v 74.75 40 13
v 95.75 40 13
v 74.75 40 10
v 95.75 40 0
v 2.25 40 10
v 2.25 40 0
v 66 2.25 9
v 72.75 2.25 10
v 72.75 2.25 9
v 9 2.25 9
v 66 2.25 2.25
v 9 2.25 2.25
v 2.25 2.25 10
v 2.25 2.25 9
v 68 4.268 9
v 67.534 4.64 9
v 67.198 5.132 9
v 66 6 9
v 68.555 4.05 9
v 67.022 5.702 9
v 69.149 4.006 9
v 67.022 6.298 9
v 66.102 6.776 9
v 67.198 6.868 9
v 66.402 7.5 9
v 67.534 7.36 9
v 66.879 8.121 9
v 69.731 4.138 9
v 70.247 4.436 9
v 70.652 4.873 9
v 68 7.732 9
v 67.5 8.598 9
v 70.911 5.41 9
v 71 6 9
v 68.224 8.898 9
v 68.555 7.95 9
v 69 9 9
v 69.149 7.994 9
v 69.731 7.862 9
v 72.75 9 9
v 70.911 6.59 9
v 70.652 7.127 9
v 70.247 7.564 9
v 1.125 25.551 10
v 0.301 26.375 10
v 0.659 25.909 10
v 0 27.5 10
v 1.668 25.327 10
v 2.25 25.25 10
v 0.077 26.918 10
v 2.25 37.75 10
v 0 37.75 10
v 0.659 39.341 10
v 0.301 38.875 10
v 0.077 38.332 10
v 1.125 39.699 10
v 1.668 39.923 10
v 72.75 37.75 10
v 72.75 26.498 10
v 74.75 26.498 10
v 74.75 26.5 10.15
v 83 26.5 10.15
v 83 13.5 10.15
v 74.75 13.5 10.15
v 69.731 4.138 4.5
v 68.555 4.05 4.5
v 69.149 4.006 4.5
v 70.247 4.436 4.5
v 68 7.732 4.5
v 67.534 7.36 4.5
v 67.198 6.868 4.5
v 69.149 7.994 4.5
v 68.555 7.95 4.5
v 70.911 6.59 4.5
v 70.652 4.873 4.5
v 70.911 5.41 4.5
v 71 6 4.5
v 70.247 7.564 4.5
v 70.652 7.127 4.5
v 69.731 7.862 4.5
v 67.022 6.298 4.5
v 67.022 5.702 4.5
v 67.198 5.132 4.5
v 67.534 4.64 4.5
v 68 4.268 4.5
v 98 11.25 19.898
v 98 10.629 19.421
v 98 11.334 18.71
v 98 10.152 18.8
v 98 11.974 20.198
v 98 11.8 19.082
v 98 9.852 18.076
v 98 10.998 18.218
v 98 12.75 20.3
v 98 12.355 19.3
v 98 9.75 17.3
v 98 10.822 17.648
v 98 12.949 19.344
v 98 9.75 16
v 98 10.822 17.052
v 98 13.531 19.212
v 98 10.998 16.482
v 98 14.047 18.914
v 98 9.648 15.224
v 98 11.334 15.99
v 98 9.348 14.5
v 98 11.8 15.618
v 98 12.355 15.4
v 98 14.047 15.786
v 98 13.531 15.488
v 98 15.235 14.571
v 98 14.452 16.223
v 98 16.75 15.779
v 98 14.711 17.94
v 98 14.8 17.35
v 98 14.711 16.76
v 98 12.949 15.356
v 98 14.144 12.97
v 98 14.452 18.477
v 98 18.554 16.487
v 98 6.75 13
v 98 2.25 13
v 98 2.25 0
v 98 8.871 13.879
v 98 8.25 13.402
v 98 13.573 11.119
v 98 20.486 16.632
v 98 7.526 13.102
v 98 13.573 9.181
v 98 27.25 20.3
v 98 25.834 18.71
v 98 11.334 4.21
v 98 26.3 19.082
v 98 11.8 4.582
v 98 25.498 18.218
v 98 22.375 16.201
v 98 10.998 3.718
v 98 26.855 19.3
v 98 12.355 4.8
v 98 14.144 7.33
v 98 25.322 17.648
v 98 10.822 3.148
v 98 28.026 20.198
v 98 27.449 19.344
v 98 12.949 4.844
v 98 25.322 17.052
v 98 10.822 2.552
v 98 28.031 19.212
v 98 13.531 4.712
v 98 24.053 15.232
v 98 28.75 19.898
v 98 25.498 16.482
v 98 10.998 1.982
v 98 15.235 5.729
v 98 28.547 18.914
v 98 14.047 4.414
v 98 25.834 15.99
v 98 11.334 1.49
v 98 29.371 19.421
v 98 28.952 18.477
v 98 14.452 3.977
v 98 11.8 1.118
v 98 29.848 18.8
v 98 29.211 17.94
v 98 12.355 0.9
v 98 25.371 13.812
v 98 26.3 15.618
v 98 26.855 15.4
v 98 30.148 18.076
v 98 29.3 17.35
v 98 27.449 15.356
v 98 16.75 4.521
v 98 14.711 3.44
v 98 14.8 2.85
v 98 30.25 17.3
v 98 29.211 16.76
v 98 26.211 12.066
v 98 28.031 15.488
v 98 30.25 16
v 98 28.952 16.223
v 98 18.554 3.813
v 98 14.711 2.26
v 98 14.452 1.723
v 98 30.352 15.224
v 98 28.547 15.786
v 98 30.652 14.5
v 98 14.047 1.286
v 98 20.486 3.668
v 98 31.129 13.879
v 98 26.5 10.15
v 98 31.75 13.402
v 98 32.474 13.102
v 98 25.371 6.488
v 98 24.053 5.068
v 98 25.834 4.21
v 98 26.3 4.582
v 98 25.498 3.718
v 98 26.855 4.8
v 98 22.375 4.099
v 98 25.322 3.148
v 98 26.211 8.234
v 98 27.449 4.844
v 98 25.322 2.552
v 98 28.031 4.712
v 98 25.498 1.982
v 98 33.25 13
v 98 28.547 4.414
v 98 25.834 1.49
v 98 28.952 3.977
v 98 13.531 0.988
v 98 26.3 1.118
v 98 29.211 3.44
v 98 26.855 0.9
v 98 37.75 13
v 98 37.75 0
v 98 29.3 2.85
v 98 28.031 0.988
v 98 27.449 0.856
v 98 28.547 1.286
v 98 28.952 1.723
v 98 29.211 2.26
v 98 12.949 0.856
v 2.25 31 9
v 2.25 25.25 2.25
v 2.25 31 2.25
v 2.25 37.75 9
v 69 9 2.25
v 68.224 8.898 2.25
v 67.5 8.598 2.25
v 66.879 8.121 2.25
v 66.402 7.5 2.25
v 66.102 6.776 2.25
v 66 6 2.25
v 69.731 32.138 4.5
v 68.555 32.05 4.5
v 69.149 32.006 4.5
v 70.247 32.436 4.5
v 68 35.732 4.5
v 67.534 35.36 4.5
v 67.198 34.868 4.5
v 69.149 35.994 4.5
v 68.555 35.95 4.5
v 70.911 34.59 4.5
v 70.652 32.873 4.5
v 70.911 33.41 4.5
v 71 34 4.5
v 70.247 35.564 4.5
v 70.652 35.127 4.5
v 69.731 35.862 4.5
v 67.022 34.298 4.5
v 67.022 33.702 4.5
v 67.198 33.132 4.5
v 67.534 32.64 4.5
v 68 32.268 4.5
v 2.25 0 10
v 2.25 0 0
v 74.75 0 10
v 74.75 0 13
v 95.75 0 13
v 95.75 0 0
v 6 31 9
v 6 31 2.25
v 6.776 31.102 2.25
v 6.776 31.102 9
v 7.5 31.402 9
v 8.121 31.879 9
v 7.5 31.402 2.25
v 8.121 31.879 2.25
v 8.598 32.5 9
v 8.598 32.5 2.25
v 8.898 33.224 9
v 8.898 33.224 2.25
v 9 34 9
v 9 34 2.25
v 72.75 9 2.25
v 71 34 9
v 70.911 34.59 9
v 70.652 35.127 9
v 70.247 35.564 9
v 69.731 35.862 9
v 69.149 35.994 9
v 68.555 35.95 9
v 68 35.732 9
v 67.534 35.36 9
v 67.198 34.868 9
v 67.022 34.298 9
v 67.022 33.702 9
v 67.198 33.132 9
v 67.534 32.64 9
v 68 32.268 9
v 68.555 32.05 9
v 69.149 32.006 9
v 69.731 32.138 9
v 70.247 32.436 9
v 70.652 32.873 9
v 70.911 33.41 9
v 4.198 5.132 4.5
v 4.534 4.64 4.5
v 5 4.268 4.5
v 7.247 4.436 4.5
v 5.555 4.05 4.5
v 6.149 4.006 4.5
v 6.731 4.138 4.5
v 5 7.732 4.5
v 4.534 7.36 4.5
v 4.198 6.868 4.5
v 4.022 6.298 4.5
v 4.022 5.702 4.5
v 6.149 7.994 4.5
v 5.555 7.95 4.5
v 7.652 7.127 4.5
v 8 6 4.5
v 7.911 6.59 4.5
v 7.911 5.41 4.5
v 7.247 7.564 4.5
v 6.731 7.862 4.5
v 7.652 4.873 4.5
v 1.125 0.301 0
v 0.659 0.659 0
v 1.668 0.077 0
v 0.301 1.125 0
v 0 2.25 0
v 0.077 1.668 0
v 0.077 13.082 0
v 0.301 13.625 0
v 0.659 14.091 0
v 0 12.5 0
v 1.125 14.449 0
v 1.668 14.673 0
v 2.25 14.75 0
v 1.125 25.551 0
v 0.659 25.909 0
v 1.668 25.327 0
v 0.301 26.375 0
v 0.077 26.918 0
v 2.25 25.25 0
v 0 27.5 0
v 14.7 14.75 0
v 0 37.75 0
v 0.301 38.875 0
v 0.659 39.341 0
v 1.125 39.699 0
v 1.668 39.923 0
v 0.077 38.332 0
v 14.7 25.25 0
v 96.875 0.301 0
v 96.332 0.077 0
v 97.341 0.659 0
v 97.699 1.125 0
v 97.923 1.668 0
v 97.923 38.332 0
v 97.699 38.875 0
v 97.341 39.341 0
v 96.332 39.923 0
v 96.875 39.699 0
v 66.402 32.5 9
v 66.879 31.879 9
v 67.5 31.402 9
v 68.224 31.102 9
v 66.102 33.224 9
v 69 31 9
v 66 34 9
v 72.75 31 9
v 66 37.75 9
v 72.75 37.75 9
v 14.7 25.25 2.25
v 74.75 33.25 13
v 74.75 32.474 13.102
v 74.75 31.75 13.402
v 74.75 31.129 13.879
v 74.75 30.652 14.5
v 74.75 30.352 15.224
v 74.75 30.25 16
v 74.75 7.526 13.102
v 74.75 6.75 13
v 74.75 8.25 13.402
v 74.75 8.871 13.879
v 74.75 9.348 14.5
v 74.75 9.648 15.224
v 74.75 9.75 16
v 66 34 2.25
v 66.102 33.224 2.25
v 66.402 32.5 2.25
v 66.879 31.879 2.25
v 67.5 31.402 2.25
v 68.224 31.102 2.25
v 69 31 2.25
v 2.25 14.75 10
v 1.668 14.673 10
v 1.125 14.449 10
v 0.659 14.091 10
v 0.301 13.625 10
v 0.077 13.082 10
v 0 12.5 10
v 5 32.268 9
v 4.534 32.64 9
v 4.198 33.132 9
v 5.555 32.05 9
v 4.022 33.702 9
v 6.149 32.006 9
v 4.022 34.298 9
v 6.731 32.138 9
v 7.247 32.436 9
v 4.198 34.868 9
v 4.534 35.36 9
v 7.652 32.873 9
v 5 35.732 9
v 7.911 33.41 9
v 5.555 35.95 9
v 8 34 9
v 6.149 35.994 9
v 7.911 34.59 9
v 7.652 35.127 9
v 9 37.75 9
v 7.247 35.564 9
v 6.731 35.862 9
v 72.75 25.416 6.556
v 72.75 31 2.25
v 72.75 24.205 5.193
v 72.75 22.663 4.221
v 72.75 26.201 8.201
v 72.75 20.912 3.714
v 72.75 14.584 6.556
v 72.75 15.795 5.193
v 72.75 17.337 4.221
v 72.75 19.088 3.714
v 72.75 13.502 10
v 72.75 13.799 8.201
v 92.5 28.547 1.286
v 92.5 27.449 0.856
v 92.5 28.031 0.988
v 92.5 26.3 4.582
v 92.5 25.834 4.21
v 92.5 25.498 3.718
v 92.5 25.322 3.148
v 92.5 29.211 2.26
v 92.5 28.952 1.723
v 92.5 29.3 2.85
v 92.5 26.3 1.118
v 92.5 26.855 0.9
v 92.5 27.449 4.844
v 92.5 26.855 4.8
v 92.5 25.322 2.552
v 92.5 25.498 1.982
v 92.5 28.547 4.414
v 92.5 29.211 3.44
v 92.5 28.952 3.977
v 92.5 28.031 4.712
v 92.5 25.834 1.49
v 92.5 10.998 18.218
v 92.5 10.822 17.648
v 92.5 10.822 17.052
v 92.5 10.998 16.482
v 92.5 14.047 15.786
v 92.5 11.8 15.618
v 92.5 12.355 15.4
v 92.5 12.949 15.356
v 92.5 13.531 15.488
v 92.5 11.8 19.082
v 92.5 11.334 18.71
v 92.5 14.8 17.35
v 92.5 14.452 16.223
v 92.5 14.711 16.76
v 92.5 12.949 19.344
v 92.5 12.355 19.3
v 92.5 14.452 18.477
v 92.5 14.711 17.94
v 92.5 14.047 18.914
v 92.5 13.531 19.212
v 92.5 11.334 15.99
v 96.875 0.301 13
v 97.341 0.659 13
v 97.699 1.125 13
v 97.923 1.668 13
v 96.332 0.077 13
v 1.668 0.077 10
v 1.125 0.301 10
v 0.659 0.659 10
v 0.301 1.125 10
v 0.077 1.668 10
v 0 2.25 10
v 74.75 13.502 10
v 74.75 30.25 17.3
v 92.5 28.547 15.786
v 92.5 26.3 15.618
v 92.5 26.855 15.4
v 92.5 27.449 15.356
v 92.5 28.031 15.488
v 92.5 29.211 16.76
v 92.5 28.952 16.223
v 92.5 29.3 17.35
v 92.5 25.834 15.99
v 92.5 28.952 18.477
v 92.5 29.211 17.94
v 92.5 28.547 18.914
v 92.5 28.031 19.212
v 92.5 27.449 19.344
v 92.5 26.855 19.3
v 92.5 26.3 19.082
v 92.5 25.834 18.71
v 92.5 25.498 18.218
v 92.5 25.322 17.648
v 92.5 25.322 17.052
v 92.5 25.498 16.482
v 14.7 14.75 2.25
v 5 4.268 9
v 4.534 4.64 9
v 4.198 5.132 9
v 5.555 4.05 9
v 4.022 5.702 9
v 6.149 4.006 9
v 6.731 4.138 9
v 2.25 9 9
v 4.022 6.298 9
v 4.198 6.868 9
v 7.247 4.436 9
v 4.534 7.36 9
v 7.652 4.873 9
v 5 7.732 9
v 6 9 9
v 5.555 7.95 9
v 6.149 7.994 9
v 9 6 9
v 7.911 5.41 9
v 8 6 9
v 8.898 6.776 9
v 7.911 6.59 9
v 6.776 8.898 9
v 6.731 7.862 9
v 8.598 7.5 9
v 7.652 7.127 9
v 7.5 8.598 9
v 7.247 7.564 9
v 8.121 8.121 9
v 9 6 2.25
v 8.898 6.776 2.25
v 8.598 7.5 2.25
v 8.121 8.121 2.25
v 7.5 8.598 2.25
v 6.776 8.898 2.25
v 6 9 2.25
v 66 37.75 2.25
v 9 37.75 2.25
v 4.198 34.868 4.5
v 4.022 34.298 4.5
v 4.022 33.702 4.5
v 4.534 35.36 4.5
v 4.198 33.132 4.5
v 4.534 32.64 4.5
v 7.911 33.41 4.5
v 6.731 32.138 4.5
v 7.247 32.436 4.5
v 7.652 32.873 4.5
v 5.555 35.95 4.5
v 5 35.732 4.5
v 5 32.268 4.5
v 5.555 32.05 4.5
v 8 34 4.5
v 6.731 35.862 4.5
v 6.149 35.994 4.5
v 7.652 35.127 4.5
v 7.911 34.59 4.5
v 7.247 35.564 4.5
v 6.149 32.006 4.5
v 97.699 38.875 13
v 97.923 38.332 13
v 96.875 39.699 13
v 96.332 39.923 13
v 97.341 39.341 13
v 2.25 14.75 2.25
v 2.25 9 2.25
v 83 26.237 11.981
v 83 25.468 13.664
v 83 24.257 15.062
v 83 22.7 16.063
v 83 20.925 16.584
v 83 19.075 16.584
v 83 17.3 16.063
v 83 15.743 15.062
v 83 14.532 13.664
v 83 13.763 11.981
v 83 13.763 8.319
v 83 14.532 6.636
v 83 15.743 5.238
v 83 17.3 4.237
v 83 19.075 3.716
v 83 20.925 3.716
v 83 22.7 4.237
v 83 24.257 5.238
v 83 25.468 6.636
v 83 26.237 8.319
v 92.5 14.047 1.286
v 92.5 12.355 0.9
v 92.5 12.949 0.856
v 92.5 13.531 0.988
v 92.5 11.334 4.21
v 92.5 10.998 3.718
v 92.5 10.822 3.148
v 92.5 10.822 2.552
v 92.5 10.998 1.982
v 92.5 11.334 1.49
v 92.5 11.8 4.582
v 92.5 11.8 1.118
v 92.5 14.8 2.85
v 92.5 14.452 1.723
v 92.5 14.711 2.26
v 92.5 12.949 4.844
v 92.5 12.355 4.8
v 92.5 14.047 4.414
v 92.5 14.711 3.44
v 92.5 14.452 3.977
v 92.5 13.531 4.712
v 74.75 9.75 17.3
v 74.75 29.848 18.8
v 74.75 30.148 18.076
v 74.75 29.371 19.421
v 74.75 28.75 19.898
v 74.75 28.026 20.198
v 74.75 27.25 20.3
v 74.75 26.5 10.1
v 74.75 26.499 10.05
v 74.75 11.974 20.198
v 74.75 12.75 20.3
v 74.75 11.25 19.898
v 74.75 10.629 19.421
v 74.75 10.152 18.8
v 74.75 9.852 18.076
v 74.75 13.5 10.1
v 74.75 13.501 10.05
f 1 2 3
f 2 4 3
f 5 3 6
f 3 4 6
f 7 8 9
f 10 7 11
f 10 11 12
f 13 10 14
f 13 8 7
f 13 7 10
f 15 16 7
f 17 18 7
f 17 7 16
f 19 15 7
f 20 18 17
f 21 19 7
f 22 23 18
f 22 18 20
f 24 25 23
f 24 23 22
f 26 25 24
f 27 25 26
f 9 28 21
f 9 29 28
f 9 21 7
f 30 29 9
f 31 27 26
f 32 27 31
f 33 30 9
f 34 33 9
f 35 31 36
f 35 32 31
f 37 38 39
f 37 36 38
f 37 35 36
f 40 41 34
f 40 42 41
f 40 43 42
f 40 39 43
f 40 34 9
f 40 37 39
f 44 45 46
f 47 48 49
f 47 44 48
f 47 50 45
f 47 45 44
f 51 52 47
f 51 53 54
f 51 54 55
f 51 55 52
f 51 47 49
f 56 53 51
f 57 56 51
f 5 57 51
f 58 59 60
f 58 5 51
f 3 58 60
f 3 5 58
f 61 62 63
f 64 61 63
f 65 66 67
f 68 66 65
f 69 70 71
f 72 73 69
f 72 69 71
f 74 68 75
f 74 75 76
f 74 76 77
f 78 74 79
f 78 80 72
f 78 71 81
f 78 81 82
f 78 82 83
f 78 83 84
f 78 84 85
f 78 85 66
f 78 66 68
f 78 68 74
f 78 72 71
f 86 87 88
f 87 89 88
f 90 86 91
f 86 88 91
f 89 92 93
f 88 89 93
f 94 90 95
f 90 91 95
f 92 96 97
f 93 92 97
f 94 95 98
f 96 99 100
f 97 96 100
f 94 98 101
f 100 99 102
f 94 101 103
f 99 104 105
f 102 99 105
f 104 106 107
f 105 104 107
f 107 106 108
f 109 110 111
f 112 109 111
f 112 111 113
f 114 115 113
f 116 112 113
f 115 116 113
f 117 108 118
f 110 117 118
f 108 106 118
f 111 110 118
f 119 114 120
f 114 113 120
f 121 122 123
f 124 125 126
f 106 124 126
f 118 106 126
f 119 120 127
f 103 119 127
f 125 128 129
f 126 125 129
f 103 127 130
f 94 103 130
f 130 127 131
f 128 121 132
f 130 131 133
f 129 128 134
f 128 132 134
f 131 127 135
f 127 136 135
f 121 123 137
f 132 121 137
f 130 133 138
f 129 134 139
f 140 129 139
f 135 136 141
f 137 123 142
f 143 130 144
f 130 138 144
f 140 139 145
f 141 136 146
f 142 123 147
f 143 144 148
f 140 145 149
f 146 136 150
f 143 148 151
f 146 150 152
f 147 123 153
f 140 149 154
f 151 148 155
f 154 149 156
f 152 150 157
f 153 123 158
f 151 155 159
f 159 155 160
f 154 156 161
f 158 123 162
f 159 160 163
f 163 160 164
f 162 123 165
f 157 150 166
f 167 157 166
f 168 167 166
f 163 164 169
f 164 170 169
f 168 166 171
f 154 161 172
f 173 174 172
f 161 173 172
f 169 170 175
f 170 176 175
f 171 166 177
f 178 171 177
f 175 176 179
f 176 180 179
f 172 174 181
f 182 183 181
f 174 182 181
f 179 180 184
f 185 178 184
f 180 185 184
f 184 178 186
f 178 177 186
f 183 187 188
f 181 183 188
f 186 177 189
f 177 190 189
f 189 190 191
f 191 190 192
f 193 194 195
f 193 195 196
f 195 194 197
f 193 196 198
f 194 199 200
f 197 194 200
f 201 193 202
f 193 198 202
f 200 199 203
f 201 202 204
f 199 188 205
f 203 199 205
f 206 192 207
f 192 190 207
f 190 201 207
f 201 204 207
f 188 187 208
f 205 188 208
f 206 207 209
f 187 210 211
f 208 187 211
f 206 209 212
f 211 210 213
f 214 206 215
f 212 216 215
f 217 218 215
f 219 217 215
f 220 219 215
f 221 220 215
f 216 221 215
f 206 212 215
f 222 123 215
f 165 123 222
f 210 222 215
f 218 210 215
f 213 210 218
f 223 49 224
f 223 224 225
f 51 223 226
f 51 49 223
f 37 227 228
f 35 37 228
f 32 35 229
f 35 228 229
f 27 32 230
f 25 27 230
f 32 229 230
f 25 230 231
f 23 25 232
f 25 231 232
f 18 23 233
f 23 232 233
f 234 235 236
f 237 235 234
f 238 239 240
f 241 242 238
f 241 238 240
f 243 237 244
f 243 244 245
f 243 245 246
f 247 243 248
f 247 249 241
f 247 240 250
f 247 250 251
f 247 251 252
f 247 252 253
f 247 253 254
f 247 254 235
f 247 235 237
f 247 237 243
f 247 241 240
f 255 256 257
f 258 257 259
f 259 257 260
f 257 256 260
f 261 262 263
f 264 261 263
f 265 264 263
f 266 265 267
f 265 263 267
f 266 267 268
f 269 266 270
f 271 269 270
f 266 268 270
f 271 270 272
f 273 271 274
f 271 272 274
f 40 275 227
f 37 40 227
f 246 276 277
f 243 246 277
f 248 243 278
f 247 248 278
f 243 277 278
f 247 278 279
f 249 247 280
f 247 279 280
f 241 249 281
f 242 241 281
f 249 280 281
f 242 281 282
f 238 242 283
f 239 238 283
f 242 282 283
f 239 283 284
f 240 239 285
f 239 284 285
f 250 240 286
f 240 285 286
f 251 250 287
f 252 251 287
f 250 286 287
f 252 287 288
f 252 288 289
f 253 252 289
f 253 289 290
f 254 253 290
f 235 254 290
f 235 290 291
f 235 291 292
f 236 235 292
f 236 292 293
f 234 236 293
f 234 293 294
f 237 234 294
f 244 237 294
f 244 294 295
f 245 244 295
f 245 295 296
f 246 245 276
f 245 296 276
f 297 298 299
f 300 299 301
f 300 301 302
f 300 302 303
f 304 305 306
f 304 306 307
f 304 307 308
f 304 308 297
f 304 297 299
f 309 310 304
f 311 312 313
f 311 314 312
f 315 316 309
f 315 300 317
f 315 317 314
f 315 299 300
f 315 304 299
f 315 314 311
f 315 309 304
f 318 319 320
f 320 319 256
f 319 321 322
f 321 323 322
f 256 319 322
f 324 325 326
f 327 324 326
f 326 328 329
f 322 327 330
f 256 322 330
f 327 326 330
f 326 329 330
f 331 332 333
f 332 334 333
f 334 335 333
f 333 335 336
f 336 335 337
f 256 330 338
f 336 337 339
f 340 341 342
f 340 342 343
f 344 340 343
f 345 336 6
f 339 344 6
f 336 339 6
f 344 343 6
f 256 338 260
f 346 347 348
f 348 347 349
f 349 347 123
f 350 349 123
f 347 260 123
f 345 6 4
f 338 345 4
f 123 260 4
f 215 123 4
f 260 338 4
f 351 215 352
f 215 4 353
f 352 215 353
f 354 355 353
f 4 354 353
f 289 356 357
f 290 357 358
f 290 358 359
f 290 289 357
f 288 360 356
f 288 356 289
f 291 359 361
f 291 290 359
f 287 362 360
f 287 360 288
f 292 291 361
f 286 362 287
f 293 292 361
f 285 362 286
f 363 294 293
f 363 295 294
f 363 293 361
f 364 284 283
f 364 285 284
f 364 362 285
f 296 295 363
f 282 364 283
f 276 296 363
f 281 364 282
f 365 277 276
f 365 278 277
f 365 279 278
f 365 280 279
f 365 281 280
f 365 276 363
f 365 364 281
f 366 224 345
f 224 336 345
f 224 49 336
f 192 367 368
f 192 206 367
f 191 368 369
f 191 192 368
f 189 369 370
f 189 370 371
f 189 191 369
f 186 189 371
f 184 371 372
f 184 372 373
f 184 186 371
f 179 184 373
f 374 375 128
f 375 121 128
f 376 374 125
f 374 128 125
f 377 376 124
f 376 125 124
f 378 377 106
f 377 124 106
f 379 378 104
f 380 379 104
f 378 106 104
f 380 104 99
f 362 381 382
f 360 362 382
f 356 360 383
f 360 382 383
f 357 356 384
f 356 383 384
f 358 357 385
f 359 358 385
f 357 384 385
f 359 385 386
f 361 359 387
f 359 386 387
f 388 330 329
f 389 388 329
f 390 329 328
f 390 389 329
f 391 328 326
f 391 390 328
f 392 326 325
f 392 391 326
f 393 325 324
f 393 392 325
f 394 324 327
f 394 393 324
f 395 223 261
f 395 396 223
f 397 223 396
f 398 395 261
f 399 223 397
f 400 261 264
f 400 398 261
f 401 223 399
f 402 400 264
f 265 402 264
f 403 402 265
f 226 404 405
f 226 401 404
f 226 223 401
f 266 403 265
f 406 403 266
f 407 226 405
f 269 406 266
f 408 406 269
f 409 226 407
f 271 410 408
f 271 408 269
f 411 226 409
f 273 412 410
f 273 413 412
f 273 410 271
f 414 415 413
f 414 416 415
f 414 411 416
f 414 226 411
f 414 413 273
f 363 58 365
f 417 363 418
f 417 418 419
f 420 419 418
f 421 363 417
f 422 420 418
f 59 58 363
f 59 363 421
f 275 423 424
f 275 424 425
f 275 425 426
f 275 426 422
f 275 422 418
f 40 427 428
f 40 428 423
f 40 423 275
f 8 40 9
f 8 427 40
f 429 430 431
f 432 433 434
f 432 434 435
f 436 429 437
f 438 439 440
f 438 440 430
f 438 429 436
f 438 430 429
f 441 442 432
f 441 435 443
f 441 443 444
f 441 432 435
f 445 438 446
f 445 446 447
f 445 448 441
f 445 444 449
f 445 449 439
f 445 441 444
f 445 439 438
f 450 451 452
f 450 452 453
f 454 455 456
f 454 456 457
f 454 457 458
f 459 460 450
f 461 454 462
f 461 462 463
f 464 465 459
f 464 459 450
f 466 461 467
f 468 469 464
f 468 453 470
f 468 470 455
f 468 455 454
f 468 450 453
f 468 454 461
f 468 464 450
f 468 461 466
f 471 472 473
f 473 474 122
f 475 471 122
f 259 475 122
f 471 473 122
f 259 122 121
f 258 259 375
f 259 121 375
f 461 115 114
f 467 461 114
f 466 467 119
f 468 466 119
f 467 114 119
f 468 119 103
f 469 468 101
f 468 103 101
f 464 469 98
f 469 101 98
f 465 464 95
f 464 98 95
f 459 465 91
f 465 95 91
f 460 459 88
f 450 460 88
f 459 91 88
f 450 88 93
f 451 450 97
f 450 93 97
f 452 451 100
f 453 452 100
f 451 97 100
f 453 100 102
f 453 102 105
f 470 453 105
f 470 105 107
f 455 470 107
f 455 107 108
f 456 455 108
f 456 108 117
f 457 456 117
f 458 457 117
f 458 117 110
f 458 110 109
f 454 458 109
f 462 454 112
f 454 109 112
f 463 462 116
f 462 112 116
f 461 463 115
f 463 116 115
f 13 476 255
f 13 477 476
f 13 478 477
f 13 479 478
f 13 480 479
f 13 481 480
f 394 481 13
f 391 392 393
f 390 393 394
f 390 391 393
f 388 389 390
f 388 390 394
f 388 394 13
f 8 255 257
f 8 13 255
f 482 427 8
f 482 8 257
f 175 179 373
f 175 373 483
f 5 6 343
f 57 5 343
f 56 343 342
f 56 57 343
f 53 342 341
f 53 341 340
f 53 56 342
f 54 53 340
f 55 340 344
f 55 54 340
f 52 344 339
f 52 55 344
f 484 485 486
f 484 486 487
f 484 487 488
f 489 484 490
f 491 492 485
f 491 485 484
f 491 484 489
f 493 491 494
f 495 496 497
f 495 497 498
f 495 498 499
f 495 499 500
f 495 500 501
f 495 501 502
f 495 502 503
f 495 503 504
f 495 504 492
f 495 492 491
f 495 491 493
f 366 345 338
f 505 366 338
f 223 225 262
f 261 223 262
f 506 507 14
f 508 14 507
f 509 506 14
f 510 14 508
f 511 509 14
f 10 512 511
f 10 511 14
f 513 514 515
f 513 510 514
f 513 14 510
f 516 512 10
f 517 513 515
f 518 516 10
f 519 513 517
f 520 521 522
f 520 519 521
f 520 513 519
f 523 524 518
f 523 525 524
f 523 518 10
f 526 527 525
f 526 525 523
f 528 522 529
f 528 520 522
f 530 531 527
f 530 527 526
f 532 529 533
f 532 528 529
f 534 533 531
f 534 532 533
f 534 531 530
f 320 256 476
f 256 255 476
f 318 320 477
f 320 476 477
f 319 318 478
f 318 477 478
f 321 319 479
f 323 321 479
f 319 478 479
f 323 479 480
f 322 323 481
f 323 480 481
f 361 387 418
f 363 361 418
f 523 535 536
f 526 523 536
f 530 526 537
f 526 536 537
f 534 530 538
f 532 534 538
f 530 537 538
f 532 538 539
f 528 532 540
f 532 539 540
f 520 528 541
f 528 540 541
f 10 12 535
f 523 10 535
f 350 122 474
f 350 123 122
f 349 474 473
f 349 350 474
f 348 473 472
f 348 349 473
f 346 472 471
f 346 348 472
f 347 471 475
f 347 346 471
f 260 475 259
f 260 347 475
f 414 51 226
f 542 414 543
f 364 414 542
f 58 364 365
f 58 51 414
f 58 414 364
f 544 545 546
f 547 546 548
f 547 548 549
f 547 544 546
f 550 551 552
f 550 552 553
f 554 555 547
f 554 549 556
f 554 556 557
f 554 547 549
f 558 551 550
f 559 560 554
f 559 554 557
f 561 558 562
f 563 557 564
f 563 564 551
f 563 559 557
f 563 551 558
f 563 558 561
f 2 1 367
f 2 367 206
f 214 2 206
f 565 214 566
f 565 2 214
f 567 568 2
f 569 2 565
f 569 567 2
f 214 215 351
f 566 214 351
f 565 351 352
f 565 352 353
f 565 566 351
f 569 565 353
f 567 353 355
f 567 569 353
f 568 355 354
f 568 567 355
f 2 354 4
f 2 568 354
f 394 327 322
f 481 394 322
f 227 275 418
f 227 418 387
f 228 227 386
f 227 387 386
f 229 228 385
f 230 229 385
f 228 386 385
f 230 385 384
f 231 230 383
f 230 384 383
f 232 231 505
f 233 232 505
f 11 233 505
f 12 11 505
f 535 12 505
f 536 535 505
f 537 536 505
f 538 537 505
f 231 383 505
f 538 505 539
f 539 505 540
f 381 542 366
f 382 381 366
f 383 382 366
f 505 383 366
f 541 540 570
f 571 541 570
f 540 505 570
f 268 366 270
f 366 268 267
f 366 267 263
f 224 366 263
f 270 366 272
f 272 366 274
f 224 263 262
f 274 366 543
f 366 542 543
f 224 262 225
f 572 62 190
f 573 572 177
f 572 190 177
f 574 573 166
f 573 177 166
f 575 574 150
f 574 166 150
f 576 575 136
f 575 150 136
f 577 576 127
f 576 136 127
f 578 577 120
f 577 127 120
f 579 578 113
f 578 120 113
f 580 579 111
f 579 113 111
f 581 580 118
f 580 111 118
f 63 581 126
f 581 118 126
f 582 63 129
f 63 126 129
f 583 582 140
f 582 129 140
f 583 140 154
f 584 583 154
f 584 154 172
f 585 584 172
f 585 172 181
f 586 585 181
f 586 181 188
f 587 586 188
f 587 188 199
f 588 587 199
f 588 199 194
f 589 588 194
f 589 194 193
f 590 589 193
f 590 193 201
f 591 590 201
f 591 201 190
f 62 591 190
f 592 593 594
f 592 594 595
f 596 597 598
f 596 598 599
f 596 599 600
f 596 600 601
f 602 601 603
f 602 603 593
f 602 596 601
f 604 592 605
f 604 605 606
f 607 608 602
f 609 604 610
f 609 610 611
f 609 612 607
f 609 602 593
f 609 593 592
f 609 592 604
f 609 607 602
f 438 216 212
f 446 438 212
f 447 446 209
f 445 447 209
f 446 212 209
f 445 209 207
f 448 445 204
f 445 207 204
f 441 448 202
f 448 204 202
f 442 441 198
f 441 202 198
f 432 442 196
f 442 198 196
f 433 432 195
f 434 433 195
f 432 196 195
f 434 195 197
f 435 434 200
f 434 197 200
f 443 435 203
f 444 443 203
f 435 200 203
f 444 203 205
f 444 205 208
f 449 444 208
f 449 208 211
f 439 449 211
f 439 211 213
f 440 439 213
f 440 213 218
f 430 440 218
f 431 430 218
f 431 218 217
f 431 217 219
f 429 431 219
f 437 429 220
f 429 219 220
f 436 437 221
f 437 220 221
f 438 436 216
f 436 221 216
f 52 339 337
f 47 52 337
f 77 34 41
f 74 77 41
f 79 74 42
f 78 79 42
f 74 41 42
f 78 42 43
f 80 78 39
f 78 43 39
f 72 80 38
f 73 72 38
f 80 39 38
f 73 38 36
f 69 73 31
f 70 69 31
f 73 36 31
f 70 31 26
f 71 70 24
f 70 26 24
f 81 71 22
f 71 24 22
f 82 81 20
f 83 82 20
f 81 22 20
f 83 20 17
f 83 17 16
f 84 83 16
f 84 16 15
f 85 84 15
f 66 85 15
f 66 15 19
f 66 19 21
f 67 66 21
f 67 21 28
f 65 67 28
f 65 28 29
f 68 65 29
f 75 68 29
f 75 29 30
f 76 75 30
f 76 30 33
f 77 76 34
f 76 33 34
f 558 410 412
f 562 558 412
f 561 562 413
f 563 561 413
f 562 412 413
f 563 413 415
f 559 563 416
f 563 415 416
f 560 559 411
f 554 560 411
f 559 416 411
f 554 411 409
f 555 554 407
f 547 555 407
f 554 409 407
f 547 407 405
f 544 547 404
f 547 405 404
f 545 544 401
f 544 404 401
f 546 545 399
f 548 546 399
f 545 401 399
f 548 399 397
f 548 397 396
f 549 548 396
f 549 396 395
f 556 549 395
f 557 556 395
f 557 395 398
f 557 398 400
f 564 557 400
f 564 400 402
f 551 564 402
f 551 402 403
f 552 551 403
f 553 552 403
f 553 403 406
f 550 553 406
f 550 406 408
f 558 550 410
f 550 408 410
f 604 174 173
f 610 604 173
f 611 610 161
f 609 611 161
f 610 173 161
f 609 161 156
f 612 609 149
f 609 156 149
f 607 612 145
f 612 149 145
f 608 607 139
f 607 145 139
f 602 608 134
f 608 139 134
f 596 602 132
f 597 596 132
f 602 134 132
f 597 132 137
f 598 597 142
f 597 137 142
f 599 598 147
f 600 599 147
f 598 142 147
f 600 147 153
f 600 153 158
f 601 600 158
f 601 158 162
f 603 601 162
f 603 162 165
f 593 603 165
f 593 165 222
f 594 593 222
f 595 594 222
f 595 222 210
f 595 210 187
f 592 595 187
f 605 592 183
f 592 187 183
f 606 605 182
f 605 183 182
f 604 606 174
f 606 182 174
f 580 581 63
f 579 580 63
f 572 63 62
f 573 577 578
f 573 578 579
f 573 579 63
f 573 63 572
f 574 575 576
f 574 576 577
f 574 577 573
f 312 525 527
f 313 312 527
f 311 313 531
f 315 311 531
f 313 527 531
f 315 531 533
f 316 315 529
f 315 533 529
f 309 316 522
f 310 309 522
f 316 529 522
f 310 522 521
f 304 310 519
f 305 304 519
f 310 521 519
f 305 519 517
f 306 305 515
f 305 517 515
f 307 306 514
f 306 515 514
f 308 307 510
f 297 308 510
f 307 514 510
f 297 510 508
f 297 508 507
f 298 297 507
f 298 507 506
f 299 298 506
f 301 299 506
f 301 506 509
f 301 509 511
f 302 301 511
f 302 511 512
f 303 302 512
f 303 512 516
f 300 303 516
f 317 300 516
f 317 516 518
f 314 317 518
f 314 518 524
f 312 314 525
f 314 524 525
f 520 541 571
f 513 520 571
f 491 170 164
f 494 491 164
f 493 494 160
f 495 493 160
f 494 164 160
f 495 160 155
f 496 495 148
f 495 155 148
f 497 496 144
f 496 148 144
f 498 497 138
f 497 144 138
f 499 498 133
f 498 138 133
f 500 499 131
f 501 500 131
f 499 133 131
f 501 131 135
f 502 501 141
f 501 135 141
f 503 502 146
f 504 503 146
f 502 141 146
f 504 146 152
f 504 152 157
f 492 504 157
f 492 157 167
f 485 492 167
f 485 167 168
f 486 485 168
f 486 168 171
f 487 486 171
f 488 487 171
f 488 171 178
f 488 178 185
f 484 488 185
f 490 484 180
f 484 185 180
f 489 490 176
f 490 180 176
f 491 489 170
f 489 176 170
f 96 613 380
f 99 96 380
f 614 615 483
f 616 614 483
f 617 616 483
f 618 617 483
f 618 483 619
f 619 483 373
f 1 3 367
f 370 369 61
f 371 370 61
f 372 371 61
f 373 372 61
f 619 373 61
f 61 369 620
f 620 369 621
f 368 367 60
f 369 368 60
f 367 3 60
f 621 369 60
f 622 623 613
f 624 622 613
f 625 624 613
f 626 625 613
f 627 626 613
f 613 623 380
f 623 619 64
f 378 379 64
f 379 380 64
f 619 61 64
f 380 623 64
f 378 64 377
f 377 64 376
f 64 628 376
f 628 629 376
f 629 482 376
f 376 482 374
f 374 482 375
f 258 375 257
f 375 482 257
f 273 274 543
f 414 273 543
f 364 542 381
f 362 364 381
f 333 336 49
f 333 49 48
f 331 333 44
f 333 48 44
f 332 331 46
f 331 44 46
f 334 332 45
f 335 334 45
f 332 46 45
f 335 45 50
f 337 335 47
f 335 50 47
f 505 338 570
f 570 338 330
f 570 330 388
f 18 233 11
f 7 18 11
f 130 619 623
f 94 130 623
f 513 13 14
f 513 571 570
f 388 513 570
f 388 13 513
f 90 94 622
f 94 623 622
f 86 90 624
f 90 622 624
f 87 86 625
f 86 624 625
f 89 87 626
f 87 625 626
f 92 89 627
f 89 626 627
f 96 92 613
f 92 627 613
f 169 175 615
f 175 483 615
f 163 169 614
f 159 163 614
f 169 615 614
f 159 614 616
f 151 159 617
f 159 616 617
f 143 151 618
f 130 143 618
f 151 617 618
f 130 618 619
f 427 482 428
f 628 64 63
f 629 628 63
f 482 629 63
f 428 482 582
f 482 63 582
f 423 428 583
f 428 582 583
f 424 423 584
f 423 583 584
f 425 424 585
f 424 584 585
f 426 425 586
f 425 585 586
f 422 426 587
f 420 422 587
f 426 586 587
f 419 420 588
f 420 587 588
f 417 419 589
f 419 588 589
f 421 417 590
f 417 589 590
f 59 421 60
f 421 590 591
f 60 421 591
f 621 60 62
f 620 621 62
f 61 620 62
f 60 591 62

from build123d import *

# Parameters (mm, degrees)
BODY_DEPTH          = 10
PCB_RECESS_DEPTH    = 7.75
SKETCH11_R          = 3.000000000000004
SKETCH11_R_2        = 2.999999999999999
SKETCH11_R_3        = 3.000000000000008
SKETCH11_R_4        = 3.0000000000000084
PCB_BOSS_DEPTH      = 6.75
FILLET2_R           = 2.25
BOSS_EXTRUDE2_DEPTH = 23.25
BOSS_EXTRUDE3_DEPTH = 3
SKETCH25_R          = 6.5
CUT_EXTRUDE9_DEPTH  = 15
CUT_EXTRUDE10_DEPTH = 10.25
FILLET7_R           = 3
FILLET8_R           = 2.25
SKETCH27_R          = 2.0000000000000067
SKETCH27_R_2        = 2.000000000000003
SKETCH27_R_3        = 2
SKETCH27_R_4        = 1.9999999999999996
CUT_EXTRUDE11_DEPTH = 5.5
SKETCH12_R          = 1.9999999999999991
SKETCH12_R_2        = 1.9999999999999967
SKETCH12_R_3        = 1.9999999999999996
CUT_EXTRUDE5_DEPTH  = 4.5


with BuildPart() as part:
    # Sketch4 → body (new body)
    with BuildSketch(Plane.XY):
        Polygon((0, 40), (1.73e-15, 25.25), (14.7, 25.25), (14.7, 14.750000000000002), (0, 14.75), (0, 0), (97.99999999999999, 6.94e-15), (98, 40.00000000000001), align=None)
    extrude(amount=BODY_DEPTH)

    # Sketch10 → pcb-recess (cut)
    with BuildSketch(Plane.XY.offset(10)):
        Polygon((72.75000000000001, 2.250000000000009), (2.2500000000000018, 2.2500000000000004), (2.2500000000000044, 37.74999999999999), (72.75, 37.75000000000001), align=None)
    extrude(amount=-PCB_RECESS_DEPTH, mode=Mode.SUBTRACT)

    # Sketch11 → pcb-boss (add)
    with BuildSketch(Plane.XY.offset(2.25)):
        with Locations((6.000000000000004, 34)):
            Circle(SKETCH11_R)
        with BuildLine():
            Line((2.250000000000004, 31), (6.000000000000004, 31))
            ThreePointArc((6.0000000000000036, 30.999999999999996), (3.8786796564403594, 36.121320343559645), (9.000000000000009, 34))
            Line((9.000000000000007, 34), (9.000000000000007, 37.74999999999999))
            Line((9.000000000000007, 37.74999999999999), (2.2500000000000044, 37.74999999999999))
            Line((2.2500000000000044, 37.74999999999999), (2.250000000000004, 31))
        make_face()
        with BuildLine():
            Line((2.2500000000000018, 2.2500000000000004), (9.000000000000007, 2.2500000000000013))
            Line((9.000000000000007, 2.2500000000000013), (9.000000000000007, 6.000000000000005))
            ThreePointArc((9.000000000000007, 6.000000000000004), (3.8786796564403647, 3.8786796564403634), (6.000000000000007, 9.000000000000004))
            Line((6.000000000000007, 9.000000000000005), (2.250000000000002, 9.000000000000014))
            Line((2.250000000000002, 9.000000000000014), (2.2500000000000018, 2.25))
        make_face()
        with Locations((6.000000000000007, 6.000000000000005)):
            Circle(SKETCH11_R_2)
        with Locations((69, 6.000000000000005)):
            Circle(SKETCH11_R_3)
        with BuildLine():
            Line((72.75000000000001, 2.250000000000009), (72.75000000000001, 9.000000000000012))
            Line((72.75000000000001, 9.000000000000012), (69, 9.000000000000012))
            ThreePointArc((69, 9.000000000000014), (71.12132034355965, 8.121320343559653), (72.00000000000001, 6.000000000000005))
            ThreePointArc((72.00000000000001, 6.000000000000004), (69, 2.9999999999999973), (65.99999999999999, 6.000000000000005))
            Line((66, 6.000000000000005), (66, 2.250000000000008))
            Line((66, 2.250000000000008), (72.75000000000001, 2.250000000000009))
        make_face()
        with BuildLine():
            Line((72.75, 37.75000000000001), (66, 37.75000000000001))
            Line((66, 37.75000000000001), (66, 34))
            ThreePointArc((65.99999999999999, 34), (69, 37.00000000000001), (72.00000000000001, 34))
            ThreePointArc((72.00000000000001, 34), (71.12132034355965, 31.87867965644035), (69, 30.999999999999993))
            Line((69, 30.999999999999993), (72.75, 30.999999999999993))
            Line((72.75, 30.999999999999993), (72.75, 37.75000000000001))
        make_face()
        with Locations((69, 34)):
            Circle(SKETCH11_R_4)
    extrude(amount=PCB_BOSS_DEPTH)

    # Fillet2
    fillet2_edges = [part.edges().sort_by_distance(p)[0] for p in [
        (0, 14.75, 5),
        (1.73e-15, 25.25, 5),
    ]]
    fillet(fillet2_edges, radius=FILLET2_R - 0.0001)  # a hair under: the kernel refuses the full size

    # Sketch23 → Boss-Extrude2 (add)
    with BuildSketch(Plane(origin=(97.99999999999999, -3.4e-14, 0), x_dir=(0, 0, -1), z_dir=(1, -3.5e-16, 0))):
        Polygon((-10, 30.250000000000025), (-20.299999999999997, 30.25000000000003), (-20.299999999999994, 9.750000000000027), (-9.999999999999998, 9.75000000000002), align=None)
    extrude(amount=-BOSS_EXTRUDE2_DEPTH)

    # Sketch24 → Boss-Extrude3 (add)
    with BuildSketch(Plane.XY.offset(10)):
        Polygon((74.75, 30.25), (98, 30.25), (98, 40.00000000000001), (74.75, 39.99999999999999), align=None)
        Polygon((74.75000000000001, 9.749999999999995), (97.99999999999999, 9.749999999999995), (97.99999999999999, 6.94e-15), (74.75000000000001, -6.94e-15), align=None)
    extrude(amount=BOSS_EXTRUDE3_DEPTH)

    # Sketch25 → Cut-Extrude9 (cut)
    with BuildSketch(Plane(origin=(97.99999999999999, -3.4e-14, 0), x_dir=(0, 0, -1), z_dir=(1, -3.5e-16, 0))):
        with Locations(Location((-10.149999999999999, 20.000000000000025, 0), (0, 0, 90))):
            Circle(SKETCH25_R)
    extrude(amount=-CUT_EXTRUDE9_DEPTH, mode=Mode.SUBTRACT)

    # Sketch26 → Cut-Extrude10 (cut)
    with BuildSketch(Plane(origin=(83, -2.88e-14, 0), x_dir=(0, 0, -1), z_dir=(1, -3.5e-16, 0))):
        with BuildLine():
            Line((-10.149999999999999, 26.500000000000025), (-10.149999999999999, 13.500000000000027))
            ThreePointArc((-10.149999999999999, 13.500000000000027), (-3.6499999999999986, 20.000000000000025), (-10.149999999999999, 26.500000000000025))
        make_face()
    extrude(amount=-CUT_EXTRUDE10_DEPTH, mode=Mode.SUBTRACT)

    # Fillet7
    fillet7_edges = [part.edges().sort_by_distance(p)[0] for p in [
        (86.37499999999999, 9.749999999999996, 20.299999999999994),
        (86.375, 30.249999999999996, 20.299999999999997),
        (86.375, 30.25, 13),
        (86.375, 9.749999999999995, 13),
    ]]
    fillet(fillet7_edges, radius=FILLET7_R)

    # Fillet8
    fillet8_edges = [part.edges().sort_by_distance(p)[0] for p in [
        (0, 40, 5),
        (98, 40.00000000000001, 6.5),
        (97.99999999999999, 6.94e-15, 6.5),
        (0, 0, 5),
    ]]
    fillet(fillet8_edges, radius=FILLET8_R)

    # Sketch27 → Cut-Extrude11 (cut)
    with BuildSketch(Plane(origin=(97.99999999999999, -3.4e-14, 0), x_dir=(0, 0, -1), z_dir=(1, -3.5e-16, 0))):
        with Locations(Location((-17.350000000000005, 27.300000000000026, 0), (0, 0, 90))):
            Circle(SKETCH27_R)
        with Locations(Location((-2.850000000000002, 27.300000000000026, 0), (0, 0, 90))):
            Circle(SKETCH27_R_2)
        with Locations(Location((-2.8499999999999948, 12.800000000000026, 0), (0, 0, 90))):
            Circle(SKETCH27_R_3)
        with Locations(Location((-17.349999999999998, 12.800000000000026, 0), (0, 0, 90))):
            Circle(SKETCH27_R_4)
    extrude(amount=-CUT_EXTRUDE11_DEPTH, mode=Mode.SUBTRACT)

    # Sketch12 → Cut-Extrude5 (cut)
    with BuildSketch(Plane.XY.offset(9.000000000000002)):
        with Locations((6.000000000000004, 34)):
            Circle(SKETCH12_R)
        with Locations((69, 34)):
            Circle(SKETCH12_R_2)
        with Locations((69, 6.000000000000005)):
            Circle(SKETCH12_R_2)
        with Locations((6.000000000000007, 6.000000000000005)):
            Circle(SKETCH12_R_3)
    extrude(amount=-CUT_EXTRUDE5_DEPTH, mode=Mode.SUBTRACT)


solid = part.part
